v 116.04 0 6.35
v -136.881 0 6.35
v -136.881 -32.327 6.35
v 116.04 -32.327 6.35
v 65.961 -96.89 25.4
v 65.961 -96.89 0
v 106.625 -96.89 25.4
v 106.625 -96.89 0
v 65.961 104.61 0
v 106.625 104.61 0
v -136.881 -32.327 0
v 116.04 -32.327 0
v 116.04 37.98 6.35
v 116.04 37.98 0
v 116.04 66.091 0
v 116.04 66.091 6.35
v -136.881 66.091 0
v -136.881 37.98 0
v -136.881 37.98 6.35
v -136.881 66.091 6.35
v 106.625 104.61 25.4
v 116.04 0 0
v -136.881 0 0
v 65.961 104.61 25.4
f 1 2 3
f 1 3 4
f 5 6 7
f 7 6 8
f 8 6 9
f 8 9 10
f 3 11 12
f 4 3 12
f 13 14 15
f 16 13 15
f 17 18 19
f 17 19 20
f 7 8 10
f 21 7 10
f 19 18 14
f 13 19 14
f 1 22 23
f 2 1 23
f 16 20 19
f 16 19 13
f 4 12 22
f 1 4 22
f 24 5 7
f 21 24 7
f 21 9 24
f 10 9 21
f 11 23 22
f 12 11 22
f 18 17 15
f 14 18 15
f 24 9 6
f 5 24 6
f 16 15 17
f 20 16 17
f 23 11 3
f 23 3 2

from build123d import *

# Parameters (mm, degrees)
F0_W     = 20.1816186309
F0_H     = 28.1114000827
F0_W_2   = 35.2424010634
F0_W_3   = 81.4566612244
F0_W_4   = 22.8382814676
F0_W_5   = 43.1228186935
F0_W_6   = 40.664061904
F0_W_7   = 9.4144269824
F1_DEPTH = 6.35
F0_H_2   = 32.3267914355
F2_DEPTH = 6.35
F0_H_3   = 64.5633451641
F0_H_4   = 37.9799026996
F0_H_5   = 38.5190211236
F3_DEPTH = 25.4


with BuildPart() as f1:
    # F0 (on Top) → F1 (new body)
    with BuildSketch(Plane.XY):
        with Locations((-126.7898716033, 52.0356027409)):
            Rectangle(F0_W, F0_H)
        with Locations((-99.0778617561, 52.0356027409)):
            Rectangle(F0_W_2, F0_H)
        with Locations((-40.7283306122, 52.0356027409)):
            Rectangle(F0_W_3, F0_H)
        with Locations((11.4191407338, 52.0356027409)):
            Rectangle(F0_W_4, F0_H)
        with Locations((44.3996908143, 52.0356027409)):
            Rectangle(F0_W_5, F0_H)
        with Locations((86.2931311131, 52.0356027409)):
            Rectangle(F0_W_6, F0_H)
        with Locations((111.3323755562, 52.0356027409)):
            Rectangle(F0_W_7, F0_H)
    extrude(amount=F1_DEPTH)


with BuildPart() as f2:
    # F0 (on Top) → F2 (new body)
    with BuildSketch(Plane.XY):
        with Locations((-126.7898716033, -16.1633957177)):
            Rectangle(F0_W, F0_H_2)
        with Locations((-99.0778617561, -16.1633957177)):
            Rectangle(F0_W_2, F0_H_2)
        with Locations((-40.7283306122, -16.1633957177)):
            Rectangle(F0_W_3, F0_H_2)
        with Locations((11.4191407338, -16.1633957177)):
            Rectangle(F0_W_4, F0_H_2)
        with Locations((44.3996908143, -16.1633957177)):
            Rectangle(F0_W_5, F0_H_2)
        with Locations((86.2931311131, -16.1633957177)):
            Rectangle(F0_W_6, F0_H_2)
        with Locations((111.3323755562, -16.1633957177)):
            Rectangle(F0_W_7, F0_H_2)
    extrude(amount=F2_DEPTH)


with BuildPart() as f3:
    # F0 (on Top) → F3 (new body)
    with BuildSketch(Plane.XY):
        with Locations((86.2931311131, -64.6084640175)):
            Rectangle(F0_W_6, F0_H_3)
        with Locations((86.2931311131, 18.9899513498)):
            Rectangle(F0_W_6, F0_H_4)
        with Locations((86.2931311131, 85.3508133441)):
            Rectangle(F0_W_6, F0_H_5)
        with Locations((86.2931311131, -16.1633957177)):
            Rectangle(F0_W_6, F0_H_2)
        with Locations((86.2931311131, 52.0356027409)):
            Rectangle(F0_W_6, F0_H)
    extrude(amount=F3_DEPTH)


solid = Compound([f1.part, f2.part, f3.part])
